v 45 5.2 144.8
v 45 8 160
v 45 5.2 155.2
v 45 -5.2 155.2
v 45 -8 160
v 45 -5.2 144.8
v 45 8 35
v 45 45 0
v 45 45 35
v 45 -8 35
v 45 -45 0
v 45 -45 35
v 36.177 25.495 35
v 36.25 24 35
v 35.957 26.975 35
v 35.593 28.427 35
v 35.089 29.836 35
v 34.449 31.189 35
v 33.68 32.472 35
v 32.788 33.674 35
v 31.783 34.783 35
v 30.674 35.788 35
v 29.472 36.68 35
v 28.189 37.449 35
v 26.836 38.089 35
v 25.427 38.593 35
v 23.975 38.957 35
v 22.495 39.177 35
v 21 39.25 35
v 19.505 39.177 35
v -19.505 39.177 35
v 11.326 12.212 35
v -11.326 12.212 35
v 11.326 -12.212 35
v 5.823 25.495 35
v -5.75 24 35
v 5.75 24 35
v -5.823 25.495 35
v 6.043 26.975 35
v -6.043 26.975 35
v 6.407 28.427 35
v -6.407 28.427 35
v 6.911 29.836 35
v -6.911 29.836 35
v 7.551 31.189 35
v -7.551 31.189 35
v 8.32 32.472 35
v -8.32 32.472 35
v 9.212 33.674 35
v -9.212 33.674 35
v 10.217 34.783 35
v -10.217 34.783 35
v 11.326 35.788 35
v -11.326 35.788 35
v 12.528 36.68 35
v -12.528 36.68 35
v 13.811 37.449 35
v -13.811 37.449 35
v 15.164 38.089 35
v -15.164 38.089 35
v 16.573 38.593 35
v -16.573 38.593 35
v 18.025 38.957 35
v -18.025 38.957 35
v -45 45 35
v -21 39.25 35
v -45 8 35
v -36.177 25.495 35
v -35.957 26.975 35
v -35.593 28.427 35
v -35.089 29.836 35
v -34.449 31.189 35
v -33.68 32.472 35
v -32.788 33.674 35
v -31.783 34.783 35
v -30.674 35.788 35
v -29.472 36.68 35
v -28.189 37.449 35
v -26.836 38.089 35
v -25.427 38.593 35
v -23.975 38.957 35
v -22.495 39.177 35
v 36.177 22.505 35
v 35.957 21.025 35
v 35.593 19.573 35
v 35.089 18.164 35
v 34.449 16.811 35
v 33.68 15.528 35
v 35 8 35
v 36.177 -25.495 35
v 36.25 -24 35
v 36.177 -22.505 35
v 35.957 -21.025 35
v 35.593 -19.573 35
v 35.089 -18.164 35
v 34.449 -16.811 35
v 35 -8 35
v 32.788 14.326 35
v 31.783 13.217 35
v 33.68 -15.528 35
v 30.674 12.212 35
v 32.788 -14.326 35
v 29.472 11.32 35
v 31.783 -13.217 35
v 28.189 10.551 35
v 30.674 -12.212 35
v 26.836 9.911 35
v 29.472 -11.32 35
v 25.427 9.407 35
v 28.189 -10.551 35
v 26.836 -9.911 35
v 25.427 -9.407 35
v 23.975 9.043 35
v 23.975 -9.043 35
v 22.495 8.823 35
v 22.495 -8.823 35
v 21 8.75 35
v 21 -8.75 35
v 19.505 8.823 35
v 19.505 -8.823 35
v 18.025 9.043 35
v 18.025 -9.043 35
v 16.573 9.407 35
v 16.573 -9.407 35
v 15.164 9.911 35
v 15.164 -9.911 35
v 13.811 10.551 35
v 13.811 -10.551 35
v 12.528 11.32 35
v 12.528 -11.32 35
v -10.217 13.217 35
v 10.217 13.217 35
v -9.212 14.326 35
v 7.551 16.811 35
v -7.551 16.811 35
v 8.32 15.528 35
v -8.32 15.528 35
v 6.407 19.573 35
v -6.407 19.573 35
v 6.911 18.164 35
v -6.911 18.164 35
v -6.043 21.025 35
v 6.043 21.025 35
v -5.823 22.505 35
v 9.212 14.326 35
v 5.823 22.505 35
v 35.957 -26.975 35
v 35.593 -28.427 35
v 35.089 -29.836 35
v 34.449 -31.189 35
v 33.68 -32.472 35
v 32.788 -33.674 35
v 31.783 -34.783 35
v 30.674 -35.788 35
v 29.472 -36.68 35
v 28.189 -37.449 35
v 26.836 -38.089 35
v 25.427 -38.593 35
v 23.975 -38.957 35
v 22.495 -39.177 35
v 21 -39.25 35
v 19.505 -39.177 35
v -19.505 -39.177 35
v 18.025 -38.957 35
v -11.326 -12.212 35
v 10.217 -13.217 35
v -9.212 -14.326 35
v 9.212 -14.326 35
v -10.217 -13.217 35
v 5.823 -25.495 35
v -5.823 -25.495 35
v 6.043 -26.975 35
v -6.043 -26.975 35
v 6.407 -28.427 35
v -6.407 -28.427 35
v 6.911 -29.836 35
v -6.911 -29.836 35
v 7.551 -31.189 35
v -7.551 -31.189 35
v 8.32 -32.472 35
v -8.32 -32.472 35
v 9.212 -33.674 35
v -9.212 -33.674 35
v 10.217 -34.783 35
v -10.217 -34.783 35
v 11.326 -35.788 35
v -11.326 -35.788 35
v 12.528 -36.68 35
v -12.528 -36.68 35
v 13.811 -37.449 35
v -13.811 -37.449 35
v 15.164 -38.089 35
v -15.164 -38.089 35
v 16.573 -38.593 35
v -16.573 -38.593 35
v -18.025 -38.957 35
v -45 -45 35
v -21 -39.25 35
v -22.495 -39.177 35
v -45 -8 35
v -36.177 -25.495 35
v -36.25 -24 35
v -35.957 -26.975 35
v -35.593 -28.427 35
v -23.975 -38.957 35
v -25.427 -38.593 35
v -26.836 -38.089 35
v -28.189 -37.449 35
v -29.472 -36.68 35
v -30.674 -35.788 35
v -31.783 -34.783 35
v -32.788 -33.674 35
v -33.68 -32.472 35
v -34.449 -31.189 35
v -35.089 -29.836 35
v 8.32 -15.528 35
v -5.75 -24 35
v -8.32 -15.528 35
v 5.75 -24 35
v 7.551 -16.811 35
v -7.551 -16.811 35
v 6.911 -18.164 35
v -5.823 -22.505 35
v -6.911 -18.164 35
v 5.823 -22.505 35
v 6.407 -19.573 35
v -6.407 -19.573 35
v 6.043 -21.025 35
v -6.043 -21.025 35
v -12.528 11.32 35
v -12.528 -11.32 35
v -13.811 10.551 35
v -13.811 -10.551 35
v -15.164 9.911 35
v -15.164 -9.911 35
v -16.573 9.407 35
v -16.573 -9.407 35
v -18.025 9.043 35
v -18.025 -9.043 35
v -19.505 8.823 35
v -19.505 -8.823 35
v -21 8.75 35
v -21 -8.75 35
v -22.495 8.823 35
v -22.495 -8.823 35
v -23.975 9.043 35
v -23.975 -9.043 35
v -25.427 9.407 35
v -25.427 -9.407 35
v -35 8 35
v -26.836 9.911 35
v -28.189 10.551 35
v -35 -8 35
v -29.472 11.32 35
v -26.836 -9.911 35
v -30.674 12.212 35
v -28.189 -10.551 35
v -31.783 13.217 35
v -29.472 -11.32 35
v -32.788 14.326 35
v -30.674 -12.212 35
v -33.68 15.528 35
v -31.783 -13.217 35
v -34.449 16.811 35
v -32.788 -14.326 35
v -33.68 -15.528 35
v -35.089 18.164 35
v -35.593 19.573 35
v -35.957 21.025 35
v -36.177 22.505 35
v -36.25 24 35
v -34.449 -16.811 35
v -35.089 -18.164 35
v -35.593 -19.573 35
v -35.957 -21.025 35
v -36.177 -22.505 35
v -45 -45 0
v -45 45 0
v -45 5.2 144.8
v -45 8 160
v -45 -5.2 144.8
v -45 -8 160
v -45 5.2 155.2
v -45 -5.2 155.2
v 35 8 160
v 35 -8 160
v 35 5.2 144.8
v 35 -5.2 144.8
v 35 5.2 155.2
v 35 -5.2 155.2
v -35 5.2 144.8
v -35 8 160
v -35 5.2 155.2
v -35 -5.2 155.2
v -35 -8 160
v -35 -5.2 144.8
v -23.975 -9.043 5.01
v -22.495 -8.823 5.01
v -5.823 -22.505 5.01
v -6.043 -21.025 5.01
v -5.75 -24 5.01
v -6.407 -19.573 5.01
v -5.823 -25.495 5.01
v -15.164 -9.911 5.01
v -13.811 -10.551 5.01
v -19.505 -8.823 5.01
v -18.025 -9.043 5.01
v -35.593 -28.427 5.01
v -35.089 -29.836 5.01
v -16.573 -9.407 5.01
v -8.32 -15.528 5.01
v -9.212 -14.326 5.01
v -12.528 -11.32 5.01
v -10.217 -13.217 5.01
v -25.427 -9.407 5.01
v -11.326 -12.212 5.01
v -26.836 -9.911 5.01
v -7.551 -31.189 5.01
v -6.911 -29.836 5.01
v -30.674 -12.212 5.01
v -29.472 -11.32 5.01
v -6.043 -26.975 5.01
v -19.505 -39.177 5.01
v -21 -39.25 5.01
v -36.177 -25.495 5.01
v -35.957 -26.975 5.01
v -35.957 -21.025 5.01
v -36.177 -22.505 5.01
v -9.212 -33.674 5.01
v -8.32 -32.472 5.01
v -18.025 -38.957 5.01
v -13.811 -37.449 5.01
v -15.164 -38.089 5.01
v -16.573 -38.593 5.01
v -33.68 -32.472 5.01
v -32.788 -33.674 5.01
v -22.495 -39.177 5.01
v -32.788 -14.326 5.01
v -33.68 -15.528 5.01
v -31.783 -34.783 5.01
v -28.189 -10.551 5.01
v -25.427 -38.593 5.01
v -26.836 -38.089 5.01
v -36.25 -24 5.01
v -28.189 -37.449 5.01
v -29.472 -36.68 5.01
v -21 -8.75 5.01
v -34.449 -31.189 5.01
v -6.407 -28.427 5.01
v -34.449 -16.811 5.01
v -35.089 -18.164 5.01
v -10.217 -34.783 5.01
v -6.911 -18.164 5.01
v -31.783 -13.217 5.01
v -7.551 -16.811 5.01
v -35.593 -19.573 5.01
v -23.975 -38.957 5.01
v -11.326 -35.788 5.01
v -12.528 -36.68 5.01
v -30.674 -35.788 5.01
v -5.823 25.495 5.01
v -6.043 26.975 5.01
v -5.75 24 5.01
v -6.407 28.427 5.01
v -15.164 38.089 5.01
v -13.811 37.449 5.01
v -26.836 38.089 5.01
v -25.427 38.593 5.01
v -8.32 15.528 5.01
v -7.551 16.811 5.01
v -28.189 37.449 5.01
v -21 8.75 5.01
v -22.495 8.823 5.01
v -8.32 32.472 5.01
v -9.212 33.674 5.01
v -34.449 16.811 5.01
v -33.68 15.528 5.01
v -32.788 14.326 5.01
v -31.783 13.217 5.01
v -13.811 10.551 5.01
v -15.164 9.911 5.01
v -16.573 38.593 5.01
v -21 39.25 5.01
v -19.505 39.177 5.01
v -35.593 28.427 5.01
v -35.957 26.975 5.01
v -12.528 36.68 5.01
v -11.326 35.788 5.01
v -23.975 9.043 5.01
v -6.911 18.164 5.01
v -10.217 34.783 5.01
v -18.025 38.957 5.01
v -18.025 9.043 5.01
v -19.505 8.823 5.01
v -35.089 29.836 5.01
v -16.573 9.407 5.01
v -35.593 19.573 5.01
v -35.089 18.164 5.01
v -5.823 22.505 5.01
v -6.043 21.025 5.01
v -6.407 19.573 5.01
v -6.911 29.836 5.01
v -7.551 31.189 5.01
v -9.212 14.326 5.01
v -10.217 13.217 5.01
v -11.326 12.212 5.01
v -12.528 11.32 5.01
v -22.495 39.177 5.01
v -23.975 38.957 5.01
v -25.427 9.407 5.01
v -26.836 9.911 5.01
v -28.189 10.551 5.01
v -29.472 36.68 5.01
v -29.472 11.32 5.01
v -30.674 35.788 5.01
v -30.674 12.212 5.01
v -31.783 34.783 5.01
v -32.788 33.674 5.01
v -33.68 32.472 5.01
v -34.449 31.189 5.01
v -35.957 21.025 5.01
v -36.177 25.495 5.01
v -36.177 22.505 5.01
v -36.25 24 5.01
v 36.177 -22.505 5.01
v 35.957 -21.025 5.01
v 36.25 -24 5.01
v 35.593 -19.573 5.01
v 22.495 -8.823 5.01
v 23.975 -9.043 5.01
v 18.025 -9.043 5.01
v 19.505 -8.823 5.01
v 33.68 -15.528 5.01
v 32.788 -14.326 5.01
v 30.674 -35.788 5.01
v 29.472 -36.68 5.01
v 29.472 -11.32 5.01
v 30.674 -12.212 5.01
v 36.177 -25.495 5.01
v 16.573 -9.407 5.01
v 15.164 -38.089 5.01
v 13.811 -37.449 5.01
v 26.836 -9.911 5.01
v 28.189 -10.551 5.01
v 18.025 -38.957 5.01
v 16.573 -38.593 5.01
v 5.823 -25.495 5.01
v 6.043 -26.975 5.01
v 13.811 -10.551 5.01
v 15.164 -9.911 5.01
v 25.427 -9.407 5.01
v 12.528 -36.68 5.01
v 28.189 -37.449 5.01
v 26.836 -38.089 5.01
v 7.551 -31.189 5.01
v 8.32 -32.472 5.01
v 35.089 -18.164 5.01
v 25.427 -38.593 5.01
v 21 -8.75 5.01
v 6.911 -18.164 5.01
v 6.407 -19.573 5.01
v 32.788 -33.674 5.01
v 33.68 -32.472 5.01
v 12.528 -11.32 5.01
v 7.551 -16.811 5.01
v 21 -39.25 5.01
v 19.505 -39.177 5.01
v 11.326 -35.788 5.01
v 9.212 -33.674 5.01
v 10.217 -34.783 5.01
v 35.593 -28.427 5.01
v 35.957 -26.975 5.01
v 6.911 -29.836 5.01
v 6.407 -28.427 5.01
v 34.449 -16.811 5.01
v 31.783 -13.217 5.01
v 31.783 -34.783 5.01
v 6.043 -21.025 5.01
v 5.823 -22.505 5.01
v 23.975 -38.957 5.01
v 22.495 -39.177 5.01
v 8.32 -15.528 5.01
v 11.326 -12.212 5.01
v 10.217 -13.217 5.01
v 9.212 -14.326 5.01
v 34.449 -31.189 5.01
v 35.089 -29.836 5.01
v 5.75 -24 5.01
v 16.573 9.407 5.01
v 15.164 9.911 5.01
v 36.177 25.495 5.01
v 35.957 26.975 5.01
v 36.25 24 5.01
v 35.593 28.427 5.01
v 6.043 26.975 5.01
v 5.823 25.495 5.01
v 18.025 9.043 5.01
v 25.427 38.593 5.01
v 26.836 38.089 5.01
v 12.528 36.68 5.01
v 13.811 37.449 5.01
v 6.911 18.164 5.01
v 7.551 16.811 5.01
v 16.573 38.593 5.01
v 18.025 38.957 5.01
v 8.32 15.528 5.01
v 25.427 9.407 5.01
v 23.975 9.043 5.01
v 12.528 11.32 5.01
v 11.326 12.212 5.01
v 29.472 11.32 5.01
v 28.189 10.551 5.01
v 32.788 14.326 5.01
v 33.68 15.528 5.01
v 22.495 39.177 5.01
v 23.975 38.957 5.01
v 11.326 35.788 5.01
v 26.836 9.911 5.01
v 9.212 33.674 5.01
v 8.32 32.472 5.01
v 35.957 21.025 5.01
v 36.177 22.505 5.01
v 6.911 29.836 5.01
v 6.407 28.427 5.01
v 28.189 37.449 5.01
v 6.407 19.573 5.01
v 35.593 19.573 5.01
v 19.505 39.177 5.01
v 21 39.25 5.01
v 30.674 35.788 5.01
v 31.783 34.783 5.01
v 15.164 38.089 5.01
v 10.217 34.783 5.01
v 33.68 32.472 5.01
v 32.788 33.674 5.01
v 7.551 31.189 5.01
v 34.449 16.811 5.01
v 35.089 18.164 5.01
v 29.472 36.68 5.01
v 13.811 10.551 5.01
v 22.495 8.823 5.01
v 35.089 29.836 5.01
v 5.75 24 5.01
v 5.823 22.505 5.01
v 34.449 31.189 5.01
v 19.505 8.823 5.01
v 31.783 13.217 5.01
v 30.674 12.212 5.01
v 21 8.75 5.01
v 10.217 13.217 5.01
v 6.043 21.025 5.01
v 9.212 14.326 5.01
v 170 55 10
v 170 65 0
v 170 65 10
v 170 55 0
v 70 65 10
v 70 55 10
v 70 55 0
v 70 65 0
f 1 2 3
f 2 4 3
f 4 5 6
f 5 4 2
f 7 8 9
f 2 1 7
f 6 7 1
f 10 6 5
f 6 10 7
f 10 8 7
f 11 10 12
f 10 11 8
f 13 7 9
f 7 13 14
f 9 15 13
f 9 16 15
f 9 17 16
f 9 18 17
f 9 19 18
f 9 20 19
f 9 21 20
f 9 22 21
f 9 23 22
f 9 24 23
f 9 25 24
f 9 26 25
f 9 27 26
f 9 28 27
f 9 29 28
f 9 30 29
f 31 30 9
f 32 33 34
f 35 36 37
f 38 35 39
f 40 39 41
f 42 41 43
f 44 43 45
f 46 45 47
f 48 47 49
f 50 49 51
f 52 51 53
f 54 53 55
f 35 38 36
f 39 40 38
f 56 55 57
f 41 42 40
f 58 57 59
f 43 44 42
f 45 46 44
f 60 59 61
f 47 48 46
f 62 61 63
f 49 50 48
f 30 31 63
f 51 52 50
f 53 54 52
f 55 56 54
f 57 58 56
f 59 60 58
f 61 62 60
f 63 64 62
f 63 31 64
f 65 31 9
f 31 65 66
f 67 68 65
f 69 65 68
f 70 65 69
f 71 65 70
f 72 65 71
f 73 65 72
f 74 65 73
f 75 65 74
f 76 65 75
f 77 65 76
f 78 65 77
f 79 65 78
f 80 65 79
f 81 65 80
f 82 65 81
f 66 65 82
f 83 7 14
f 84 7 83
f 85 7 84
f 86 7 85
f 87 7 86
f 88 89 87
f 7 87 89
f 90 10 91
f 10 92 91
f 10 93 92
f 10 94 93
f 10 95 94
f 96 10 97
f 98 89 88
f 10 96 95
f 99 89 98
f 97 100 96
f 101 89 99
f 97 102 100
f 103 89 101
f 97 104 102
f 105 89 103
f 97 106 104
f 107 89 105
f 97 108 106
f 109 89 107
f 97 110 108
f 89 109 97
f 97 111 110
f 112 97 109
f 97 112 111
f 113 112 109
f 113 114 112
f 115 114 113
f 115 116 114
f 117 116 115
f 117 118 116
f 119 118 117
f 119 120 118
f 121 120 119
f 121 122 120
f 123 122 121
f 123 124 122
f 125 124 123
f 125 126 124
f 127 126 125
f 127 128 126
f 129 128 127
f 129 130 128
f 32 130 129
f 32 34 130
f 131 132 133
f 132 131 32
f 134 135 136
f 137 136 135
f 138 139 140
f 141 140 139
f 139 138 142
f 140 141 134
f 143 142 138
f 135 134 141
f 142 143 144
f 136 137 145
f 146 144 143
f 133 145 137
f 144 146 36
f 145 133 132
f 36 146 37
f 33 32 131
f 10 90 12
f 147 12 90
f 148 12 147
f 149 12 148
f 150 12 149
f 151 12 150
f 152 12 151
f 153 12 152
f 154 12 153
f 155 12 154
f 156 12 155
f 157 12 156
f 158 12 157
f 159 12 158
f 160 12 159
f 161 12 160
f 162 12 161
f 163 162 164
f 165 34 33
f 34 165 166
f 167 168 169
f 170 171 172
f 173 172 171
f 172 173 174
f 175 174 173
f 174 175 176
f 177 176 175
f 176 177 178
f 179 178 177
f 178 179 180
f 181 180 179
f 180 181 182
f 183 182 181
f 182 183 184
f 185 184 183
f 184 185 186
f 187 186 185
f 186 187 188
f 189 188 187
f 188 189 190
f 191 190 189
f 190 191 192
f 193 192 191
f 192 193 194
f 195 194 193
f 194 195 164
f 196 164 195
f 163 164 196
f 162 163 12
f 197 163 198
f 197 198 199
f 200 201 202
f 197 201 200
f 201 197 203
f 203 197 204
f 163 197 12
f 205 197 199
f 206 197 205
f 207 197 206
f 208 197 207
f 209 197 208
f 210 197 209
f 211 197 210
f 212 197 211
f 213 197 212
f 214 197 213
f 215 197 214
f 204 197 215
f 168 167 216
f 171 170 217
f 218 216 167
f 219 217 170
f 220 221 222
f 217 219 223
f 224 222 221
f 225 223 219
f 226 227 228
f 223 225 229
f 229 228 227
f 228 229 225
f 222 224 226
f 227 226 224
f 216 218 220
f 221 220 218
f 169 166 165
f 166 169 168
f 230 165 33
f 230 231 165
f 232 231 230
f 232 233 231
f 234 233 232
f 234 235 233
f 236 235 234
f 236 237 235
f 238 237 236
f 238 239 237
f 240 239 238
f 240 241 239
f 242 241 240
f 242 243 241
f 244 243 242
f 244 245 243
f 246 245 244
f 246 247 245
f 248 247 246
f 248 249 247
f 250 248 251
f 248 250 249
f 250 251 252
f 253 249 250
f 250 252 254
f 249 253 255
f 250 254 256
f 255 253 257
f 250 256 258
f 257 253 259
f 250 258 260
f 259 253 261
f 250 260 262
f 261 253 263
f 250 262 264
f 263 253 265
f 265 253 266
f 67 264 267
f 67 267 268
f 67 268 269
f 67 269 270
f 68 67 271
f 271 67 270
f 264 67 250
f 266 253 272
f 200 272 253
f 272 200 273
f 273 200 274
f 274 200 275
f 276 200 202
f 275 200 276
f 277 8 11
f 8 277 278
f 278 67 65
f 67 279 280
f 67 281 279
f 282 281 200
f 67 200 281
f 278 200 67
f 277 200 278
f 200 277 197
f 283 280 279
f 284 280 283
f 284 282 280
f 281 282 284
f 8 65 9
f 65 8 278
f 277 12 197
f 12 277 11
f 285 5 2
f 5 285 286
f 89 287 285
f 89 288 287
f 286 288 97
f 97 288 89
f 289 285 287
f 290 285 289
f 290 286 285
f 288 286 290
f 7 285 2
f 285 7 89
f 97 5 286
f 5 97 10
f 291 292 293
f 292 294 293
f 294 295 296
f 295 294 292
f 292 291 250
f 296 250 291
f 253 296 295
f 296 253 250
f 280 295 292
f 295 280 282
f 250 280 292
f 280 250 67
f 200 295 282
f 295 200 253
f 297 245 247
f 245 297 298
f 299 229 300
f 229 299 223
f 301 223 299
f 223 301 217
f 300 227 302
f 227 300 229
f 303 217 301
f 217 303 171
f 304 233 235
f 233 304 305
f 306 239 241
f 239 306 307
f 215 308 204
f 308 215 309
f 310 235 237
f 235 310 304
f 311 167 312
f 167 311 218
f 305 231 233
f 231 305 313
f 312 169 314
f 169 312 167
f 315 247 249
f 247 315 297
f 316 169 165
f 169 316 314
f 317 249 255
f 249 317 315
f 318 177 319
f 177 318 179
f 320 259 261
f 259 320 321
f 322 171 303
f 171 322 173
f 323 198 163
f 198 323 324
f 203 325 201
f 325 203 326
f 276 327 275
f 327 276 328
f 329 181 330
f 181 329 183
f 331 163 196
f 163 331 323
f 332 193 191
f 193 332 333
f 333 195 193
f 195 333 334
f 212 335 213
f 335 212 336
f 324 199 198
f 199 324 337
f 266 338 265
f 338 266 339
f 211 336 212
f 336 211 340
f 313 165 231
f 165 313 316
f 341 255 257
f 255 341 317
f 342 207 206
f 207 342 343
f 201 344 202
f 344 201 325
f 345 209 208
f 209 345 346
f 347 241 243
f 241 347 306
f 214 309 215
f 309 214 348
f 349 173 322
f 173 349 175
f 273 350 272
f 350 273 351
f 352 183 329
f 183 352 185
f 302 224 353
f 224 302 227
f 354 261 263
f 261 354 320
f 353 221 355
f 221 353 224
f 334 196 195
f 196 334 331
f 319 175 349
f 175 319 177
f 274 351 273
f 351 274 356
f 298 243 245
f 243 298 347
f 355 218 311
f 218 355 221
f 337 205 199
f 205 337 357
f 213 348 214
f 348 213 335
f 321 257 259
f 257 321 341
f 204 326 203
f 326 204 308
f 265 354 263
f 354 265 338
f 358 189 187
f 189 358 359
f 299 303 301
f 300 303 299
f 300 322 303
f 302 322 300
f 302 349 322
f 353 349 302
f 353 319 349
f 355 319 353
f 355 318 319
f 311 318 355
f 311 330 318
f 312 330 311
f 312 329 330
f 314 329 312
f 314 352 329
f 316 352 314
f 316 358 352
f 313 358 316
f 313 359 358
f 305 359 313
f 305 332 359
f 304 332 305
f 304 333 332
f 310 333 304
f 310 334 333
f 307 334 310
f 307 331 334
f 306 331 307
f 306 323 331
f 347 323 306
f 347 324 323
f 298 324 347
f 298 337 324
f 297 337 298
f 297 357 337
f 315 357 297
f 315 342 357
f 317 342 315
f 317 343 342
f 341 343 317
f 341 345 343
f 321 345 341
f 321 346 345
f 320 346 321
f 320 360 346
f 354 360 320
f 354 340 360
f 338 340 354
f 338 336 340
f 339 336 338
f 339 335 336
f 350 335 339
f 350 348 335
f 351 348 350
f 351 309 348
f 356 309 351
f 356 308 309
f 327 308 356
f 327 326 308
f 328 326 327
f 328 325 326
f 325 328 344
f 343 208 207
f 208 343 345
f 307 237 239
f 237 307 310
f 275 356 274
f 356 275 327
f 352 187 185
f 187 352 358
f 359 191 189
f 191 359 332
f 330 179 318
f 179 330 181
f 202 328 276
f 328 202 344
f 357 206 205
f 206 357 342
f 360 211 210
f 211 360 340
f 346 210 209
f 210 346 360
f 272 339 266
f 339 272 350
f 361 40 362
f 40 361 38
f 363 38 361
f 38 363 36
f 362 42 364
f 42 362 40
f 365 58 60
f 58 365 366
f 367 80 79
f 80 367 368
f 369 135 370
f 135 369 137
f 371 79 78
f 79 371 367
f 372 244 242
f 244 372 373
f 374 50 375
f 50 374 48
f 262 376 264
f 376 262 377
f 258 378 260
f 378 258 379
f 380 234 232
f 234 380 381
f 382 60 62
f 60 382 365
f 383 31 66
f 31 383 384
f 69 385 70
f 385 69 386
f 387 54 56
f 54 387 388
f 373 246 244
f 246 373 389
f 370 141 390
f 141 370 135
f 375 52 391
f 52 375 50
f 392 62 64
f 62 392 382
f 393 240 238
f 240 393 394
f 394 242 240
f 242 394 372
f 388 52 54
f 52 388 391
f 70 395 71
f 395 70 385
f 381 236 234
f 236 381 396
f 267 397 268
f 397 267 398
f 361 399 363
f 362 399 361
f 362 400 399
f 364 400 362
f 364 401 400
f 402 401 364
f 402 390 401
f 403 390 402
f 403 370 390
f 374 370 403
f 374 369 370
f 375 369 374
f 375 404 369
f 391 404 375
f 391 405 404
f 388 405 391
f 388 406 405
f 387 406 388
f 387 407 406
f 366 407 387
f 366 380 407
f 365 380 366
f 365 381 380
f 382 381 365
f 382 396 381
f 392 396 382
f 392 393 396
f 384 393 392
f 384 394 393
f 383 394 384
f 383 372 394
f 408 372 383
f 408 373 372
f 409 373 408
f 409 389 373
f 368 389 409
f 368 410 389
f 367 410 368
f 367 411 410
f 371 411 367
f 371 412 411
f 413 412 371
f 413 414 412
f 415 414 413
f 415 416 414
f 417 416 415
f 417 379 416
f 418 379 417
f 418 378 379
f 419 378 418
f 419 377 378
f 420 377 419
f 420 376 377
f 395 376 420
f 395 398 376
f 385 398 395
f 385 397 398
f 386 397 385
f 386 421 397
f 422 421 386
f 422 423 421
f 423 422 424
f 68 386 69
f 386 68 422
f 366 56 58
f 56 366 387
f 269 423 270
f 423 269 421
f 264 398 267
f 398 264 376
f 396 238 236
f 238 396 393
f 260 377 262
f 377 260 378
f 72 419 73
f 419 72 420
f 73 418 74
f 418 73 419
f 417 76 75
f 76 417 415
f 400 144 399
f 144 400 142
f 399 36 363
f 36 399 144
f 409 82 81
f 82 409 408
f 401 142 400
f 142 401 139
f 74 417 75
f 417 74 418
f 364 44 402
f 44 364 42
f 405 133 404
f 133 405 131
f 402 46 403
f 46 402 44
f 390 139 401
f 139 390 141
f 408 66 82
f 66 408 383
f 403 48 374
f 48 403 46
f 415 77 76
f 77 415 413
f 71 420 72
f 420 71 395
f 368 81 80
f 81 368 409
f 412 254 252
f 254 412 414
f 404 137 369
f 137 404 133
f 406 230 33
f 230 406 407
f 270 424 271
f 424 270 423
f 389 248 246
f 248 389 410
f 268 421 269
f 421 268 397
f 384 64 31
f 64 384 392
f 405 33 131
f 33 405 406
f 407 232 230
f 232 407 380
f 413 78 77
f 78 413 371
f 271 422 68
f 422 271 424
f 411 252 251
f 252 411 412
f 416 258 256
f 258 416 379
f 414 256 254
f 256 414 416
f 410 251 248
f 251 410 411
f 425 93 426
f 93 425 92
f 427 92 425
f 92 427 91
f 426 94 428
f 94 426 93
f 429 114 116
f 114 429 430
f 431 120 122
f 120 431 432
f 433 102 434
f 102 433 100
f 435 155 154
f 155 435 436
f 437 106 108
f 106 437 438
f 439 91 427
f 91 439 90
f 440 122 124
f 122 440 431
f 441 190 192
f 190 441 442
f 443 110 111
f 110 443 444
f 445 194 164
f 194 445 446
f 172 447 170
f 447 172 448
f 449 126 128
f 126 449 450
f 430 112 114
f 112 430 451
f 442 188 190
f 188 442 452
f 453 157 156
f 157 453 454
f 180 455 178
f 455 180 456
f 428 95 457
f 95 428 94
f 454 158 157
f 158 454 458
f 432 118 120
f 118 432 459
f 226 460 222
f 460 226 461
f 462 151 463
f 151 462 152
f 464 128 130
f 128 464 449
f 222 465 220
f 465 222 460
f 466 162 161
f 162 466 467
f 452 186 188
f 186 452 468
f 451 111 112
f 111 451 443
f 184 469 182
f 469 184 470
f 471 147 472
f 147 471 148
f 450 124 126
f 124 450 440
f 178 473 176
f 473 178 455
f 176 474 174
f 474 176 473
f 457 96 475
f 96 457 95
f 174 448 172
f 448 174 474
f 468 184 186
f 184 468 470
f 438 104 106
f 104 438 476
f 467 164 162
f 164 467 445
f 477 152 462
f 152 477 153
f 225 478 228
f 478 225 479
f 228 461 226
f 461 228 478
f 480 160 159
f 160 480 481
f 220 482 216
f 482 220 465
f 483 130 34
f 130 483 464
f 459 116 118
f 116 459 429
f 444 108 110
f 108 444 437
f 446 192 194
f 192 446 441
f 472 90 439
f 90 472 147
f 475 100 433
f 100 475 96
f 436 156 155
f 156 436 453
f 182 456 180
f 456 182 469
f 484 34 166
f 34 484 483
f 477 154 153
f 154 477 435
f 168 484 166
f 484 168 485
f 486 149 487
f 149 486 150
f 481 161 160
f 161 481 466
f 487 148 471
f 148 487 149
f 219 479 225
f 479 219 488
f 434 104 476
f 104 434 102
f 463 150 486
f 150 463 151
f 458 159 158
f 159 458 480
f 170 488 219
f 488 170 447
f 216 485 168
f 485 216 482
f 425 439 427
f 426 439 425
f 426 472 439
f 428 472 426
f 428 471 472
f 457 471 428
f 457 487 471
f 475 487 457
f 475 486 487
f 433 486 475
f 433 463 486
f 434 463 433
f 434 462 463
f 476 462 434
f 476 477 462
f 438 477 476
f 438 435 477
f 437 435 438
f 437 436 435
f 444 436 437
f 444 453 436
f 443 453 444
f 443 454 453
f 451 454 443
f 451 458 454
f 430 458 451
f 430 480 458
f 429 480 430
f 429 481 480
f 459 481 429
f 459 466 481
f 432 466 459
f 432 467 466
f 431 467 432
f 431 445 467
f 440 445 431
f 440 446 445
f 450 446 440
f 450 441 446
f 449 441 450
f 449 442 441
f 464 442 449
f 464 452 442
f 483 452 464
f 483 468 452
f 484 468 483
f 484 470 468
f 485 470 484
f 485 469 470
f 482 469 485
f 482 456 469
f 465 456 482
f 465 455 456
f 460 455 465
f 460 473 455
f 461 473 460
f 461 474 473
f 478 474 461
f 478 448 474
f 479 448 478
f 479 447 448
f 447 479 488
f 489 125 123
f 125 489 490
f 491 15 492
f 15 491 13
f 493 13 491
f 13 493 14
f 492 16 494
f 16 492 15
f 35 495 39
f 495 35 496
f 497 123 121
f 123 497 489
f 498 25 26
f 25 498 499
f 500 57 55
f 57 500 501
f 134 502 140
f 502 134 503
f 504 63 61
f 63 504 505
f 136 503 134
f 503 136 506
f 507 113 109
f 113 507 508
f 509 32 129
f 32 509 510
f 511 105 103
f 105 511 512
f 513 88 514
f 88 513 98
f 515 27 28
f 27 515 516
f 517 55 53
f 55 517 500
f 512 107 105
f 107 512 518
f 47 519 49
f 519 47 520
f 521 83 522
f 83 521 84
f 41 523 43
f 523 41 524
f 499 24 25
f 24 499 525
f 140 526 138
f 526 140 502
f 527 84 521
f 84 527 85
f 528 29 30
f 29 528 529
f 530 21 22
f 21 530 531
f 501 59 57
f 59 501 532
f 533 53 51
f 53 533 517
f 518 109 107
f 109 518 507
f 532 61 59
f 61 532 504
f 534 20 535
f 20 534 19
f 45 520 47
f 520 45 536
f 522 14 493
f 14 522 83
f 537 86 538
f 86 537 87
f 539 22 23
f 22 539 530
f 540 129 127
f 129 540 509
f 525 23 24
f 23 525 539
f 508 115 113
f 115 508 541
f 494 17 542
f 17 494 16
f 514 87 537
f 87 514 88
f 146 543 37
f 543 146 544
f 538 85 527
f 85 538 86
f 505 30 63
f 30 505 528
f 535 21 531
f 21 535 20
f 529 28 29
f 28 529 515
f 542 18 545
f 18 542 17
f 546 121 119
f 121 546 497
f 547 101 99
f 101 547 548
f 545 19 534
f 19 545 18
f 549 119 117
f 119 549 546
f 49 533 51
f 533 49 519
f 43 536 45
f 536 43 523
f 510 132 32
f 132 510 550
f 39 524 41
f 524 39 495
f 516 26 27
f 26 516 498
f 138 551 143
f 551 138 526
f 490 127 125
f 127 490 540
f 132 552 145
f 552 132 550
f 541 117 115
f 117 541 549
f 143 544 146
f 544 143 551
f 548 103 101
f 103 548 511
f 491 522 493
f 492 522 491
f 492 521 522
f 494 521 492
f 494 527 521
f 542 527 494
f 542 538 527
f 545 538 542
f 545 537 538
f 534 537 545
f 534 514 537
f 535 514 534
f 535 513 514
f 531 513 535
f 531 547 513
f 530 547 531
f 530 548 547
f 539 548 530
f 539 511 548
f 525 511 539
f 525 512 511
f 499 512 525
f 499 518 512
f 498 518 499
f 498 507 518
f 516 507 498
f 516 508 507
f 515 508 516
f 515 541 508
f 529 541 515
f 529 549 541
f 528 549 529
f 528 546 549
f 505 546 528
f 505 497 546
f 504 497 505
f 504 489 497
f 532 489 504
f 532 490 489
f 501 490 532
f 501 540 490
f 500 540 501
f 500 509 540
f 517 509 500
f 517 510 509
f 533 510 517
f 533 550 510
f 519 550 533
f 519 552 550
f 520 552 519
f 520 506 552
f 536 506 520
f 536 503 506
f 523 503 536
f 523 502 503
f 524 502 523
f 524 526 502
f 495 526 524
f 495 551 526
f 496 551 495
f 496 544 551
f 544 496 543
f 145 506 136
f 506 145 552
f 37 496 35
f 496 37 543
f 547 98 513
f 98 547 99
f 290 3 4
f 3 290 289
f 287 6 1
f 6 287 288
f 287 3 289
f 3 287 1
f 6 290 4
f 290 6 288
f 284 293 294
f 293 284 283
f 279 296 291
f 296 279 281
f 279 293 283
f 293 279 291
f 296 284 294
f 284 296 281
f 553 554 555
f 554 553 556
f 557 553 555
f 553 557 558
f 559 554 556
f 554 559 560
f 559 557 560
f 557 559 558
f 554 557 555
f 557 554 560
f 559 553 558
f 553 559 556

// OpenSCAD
// 50 mL conical tube carrier – two parts printed side by side
// Part 1: base block + two posts (handle posts)
// Part 2: square handle bar (pushed through the posts after printing)

// ---- Part 1: base block ----
base_w = 90;          // X width of base block
base_d = 90;          // Y depth of base block
base_h = 35;          // Z height of base block

seat_d = 30.5;        // diameter of each blind tube seat
seat_depth = 30;      // depth of each blind seat (5 mm floor remains)

// Seat centres (x, y)
seat_x = [-21, 21];
seat_y = [-24, 24];

// ---- Part 1: posts ----
post_t = 10;          // post thickness along X
post_w = 16;          // post width along Y
post_h = 160;         // post height (z = 0 to 160)
post_hole = 10.4;     // square hole side, through along X
post_hole_z = 150;    // centre height of the square hole

// ---- Part 2: handle bar ----
bar_t = 10;           // bar thickness along X
bar_w = 10;           // bar width along Y
bar_l = 100;          // bar length along X
bar_y0 = 55;          // bar Y start (10 mm gap to base +Y face at y=45)
bar_y1 = 65;          // bar Y end

$fn = 64;

// ================= PART 1 =================
module part1() {
    difference() {
        union() {
            // Base block, centred on origin in X and Y
            translate([-base_w/2, -base_d/2, 0])
                cube([base_w, base_d, base_h]);

            // Two posts, flush with the +X and -X end faces, centred on y = 0
            // +X post
            translate([base_w/2 - post_t, -post_w/2, 0])
                cube([post_t, post_w, post_h]);
            // -X post
            translate([-base_w/2, -post_w/2, 0])
                cube([post_t, post_w, post_h]);
        }

        // Four blind tube seats (cut from the top, 5 mm floor)
        for (sx = seat_x)
            for (sy = seat_y)
                translate([sx, sy, base_h - seat_depth + 0.01])
                    cylinder(h = seat_depth + 1, d = seat_d);

        // +X post hole (extends 1 mm past each face along X)
        translate([base_w/2 - post_t - 1, -post_hole/2, post_hole_z - post_hole/2])
            cube([post_t + 2, post_hole, post_hole]);

        // -X post hole (extends 1 mm past each face along X)
        translate([-base_w/2 - 1, -post_hole/2, post_hole_z - post_hole/2])
            cube([post_t + 2, post_hole, post_hole]);
    }
}

// ================= PART 2 =================
// Square handle bar lying on the bed along X, centred on x = 0,
// spanning y = 55 to 65 (10 mm gap to the base +Y face at y = 45)
module part2() {
    translate([-bar_l/2, bar_y0, 0])
        cube([bar_l, bar_w, bar_t]);
}

// ================= OUTPUT =================
// Part 1 (base + posts) centred on the origin
part1();

// Part 2 (handle bar) printed side by side, offset in +X
translate([120, 0, 0])
    part2();
